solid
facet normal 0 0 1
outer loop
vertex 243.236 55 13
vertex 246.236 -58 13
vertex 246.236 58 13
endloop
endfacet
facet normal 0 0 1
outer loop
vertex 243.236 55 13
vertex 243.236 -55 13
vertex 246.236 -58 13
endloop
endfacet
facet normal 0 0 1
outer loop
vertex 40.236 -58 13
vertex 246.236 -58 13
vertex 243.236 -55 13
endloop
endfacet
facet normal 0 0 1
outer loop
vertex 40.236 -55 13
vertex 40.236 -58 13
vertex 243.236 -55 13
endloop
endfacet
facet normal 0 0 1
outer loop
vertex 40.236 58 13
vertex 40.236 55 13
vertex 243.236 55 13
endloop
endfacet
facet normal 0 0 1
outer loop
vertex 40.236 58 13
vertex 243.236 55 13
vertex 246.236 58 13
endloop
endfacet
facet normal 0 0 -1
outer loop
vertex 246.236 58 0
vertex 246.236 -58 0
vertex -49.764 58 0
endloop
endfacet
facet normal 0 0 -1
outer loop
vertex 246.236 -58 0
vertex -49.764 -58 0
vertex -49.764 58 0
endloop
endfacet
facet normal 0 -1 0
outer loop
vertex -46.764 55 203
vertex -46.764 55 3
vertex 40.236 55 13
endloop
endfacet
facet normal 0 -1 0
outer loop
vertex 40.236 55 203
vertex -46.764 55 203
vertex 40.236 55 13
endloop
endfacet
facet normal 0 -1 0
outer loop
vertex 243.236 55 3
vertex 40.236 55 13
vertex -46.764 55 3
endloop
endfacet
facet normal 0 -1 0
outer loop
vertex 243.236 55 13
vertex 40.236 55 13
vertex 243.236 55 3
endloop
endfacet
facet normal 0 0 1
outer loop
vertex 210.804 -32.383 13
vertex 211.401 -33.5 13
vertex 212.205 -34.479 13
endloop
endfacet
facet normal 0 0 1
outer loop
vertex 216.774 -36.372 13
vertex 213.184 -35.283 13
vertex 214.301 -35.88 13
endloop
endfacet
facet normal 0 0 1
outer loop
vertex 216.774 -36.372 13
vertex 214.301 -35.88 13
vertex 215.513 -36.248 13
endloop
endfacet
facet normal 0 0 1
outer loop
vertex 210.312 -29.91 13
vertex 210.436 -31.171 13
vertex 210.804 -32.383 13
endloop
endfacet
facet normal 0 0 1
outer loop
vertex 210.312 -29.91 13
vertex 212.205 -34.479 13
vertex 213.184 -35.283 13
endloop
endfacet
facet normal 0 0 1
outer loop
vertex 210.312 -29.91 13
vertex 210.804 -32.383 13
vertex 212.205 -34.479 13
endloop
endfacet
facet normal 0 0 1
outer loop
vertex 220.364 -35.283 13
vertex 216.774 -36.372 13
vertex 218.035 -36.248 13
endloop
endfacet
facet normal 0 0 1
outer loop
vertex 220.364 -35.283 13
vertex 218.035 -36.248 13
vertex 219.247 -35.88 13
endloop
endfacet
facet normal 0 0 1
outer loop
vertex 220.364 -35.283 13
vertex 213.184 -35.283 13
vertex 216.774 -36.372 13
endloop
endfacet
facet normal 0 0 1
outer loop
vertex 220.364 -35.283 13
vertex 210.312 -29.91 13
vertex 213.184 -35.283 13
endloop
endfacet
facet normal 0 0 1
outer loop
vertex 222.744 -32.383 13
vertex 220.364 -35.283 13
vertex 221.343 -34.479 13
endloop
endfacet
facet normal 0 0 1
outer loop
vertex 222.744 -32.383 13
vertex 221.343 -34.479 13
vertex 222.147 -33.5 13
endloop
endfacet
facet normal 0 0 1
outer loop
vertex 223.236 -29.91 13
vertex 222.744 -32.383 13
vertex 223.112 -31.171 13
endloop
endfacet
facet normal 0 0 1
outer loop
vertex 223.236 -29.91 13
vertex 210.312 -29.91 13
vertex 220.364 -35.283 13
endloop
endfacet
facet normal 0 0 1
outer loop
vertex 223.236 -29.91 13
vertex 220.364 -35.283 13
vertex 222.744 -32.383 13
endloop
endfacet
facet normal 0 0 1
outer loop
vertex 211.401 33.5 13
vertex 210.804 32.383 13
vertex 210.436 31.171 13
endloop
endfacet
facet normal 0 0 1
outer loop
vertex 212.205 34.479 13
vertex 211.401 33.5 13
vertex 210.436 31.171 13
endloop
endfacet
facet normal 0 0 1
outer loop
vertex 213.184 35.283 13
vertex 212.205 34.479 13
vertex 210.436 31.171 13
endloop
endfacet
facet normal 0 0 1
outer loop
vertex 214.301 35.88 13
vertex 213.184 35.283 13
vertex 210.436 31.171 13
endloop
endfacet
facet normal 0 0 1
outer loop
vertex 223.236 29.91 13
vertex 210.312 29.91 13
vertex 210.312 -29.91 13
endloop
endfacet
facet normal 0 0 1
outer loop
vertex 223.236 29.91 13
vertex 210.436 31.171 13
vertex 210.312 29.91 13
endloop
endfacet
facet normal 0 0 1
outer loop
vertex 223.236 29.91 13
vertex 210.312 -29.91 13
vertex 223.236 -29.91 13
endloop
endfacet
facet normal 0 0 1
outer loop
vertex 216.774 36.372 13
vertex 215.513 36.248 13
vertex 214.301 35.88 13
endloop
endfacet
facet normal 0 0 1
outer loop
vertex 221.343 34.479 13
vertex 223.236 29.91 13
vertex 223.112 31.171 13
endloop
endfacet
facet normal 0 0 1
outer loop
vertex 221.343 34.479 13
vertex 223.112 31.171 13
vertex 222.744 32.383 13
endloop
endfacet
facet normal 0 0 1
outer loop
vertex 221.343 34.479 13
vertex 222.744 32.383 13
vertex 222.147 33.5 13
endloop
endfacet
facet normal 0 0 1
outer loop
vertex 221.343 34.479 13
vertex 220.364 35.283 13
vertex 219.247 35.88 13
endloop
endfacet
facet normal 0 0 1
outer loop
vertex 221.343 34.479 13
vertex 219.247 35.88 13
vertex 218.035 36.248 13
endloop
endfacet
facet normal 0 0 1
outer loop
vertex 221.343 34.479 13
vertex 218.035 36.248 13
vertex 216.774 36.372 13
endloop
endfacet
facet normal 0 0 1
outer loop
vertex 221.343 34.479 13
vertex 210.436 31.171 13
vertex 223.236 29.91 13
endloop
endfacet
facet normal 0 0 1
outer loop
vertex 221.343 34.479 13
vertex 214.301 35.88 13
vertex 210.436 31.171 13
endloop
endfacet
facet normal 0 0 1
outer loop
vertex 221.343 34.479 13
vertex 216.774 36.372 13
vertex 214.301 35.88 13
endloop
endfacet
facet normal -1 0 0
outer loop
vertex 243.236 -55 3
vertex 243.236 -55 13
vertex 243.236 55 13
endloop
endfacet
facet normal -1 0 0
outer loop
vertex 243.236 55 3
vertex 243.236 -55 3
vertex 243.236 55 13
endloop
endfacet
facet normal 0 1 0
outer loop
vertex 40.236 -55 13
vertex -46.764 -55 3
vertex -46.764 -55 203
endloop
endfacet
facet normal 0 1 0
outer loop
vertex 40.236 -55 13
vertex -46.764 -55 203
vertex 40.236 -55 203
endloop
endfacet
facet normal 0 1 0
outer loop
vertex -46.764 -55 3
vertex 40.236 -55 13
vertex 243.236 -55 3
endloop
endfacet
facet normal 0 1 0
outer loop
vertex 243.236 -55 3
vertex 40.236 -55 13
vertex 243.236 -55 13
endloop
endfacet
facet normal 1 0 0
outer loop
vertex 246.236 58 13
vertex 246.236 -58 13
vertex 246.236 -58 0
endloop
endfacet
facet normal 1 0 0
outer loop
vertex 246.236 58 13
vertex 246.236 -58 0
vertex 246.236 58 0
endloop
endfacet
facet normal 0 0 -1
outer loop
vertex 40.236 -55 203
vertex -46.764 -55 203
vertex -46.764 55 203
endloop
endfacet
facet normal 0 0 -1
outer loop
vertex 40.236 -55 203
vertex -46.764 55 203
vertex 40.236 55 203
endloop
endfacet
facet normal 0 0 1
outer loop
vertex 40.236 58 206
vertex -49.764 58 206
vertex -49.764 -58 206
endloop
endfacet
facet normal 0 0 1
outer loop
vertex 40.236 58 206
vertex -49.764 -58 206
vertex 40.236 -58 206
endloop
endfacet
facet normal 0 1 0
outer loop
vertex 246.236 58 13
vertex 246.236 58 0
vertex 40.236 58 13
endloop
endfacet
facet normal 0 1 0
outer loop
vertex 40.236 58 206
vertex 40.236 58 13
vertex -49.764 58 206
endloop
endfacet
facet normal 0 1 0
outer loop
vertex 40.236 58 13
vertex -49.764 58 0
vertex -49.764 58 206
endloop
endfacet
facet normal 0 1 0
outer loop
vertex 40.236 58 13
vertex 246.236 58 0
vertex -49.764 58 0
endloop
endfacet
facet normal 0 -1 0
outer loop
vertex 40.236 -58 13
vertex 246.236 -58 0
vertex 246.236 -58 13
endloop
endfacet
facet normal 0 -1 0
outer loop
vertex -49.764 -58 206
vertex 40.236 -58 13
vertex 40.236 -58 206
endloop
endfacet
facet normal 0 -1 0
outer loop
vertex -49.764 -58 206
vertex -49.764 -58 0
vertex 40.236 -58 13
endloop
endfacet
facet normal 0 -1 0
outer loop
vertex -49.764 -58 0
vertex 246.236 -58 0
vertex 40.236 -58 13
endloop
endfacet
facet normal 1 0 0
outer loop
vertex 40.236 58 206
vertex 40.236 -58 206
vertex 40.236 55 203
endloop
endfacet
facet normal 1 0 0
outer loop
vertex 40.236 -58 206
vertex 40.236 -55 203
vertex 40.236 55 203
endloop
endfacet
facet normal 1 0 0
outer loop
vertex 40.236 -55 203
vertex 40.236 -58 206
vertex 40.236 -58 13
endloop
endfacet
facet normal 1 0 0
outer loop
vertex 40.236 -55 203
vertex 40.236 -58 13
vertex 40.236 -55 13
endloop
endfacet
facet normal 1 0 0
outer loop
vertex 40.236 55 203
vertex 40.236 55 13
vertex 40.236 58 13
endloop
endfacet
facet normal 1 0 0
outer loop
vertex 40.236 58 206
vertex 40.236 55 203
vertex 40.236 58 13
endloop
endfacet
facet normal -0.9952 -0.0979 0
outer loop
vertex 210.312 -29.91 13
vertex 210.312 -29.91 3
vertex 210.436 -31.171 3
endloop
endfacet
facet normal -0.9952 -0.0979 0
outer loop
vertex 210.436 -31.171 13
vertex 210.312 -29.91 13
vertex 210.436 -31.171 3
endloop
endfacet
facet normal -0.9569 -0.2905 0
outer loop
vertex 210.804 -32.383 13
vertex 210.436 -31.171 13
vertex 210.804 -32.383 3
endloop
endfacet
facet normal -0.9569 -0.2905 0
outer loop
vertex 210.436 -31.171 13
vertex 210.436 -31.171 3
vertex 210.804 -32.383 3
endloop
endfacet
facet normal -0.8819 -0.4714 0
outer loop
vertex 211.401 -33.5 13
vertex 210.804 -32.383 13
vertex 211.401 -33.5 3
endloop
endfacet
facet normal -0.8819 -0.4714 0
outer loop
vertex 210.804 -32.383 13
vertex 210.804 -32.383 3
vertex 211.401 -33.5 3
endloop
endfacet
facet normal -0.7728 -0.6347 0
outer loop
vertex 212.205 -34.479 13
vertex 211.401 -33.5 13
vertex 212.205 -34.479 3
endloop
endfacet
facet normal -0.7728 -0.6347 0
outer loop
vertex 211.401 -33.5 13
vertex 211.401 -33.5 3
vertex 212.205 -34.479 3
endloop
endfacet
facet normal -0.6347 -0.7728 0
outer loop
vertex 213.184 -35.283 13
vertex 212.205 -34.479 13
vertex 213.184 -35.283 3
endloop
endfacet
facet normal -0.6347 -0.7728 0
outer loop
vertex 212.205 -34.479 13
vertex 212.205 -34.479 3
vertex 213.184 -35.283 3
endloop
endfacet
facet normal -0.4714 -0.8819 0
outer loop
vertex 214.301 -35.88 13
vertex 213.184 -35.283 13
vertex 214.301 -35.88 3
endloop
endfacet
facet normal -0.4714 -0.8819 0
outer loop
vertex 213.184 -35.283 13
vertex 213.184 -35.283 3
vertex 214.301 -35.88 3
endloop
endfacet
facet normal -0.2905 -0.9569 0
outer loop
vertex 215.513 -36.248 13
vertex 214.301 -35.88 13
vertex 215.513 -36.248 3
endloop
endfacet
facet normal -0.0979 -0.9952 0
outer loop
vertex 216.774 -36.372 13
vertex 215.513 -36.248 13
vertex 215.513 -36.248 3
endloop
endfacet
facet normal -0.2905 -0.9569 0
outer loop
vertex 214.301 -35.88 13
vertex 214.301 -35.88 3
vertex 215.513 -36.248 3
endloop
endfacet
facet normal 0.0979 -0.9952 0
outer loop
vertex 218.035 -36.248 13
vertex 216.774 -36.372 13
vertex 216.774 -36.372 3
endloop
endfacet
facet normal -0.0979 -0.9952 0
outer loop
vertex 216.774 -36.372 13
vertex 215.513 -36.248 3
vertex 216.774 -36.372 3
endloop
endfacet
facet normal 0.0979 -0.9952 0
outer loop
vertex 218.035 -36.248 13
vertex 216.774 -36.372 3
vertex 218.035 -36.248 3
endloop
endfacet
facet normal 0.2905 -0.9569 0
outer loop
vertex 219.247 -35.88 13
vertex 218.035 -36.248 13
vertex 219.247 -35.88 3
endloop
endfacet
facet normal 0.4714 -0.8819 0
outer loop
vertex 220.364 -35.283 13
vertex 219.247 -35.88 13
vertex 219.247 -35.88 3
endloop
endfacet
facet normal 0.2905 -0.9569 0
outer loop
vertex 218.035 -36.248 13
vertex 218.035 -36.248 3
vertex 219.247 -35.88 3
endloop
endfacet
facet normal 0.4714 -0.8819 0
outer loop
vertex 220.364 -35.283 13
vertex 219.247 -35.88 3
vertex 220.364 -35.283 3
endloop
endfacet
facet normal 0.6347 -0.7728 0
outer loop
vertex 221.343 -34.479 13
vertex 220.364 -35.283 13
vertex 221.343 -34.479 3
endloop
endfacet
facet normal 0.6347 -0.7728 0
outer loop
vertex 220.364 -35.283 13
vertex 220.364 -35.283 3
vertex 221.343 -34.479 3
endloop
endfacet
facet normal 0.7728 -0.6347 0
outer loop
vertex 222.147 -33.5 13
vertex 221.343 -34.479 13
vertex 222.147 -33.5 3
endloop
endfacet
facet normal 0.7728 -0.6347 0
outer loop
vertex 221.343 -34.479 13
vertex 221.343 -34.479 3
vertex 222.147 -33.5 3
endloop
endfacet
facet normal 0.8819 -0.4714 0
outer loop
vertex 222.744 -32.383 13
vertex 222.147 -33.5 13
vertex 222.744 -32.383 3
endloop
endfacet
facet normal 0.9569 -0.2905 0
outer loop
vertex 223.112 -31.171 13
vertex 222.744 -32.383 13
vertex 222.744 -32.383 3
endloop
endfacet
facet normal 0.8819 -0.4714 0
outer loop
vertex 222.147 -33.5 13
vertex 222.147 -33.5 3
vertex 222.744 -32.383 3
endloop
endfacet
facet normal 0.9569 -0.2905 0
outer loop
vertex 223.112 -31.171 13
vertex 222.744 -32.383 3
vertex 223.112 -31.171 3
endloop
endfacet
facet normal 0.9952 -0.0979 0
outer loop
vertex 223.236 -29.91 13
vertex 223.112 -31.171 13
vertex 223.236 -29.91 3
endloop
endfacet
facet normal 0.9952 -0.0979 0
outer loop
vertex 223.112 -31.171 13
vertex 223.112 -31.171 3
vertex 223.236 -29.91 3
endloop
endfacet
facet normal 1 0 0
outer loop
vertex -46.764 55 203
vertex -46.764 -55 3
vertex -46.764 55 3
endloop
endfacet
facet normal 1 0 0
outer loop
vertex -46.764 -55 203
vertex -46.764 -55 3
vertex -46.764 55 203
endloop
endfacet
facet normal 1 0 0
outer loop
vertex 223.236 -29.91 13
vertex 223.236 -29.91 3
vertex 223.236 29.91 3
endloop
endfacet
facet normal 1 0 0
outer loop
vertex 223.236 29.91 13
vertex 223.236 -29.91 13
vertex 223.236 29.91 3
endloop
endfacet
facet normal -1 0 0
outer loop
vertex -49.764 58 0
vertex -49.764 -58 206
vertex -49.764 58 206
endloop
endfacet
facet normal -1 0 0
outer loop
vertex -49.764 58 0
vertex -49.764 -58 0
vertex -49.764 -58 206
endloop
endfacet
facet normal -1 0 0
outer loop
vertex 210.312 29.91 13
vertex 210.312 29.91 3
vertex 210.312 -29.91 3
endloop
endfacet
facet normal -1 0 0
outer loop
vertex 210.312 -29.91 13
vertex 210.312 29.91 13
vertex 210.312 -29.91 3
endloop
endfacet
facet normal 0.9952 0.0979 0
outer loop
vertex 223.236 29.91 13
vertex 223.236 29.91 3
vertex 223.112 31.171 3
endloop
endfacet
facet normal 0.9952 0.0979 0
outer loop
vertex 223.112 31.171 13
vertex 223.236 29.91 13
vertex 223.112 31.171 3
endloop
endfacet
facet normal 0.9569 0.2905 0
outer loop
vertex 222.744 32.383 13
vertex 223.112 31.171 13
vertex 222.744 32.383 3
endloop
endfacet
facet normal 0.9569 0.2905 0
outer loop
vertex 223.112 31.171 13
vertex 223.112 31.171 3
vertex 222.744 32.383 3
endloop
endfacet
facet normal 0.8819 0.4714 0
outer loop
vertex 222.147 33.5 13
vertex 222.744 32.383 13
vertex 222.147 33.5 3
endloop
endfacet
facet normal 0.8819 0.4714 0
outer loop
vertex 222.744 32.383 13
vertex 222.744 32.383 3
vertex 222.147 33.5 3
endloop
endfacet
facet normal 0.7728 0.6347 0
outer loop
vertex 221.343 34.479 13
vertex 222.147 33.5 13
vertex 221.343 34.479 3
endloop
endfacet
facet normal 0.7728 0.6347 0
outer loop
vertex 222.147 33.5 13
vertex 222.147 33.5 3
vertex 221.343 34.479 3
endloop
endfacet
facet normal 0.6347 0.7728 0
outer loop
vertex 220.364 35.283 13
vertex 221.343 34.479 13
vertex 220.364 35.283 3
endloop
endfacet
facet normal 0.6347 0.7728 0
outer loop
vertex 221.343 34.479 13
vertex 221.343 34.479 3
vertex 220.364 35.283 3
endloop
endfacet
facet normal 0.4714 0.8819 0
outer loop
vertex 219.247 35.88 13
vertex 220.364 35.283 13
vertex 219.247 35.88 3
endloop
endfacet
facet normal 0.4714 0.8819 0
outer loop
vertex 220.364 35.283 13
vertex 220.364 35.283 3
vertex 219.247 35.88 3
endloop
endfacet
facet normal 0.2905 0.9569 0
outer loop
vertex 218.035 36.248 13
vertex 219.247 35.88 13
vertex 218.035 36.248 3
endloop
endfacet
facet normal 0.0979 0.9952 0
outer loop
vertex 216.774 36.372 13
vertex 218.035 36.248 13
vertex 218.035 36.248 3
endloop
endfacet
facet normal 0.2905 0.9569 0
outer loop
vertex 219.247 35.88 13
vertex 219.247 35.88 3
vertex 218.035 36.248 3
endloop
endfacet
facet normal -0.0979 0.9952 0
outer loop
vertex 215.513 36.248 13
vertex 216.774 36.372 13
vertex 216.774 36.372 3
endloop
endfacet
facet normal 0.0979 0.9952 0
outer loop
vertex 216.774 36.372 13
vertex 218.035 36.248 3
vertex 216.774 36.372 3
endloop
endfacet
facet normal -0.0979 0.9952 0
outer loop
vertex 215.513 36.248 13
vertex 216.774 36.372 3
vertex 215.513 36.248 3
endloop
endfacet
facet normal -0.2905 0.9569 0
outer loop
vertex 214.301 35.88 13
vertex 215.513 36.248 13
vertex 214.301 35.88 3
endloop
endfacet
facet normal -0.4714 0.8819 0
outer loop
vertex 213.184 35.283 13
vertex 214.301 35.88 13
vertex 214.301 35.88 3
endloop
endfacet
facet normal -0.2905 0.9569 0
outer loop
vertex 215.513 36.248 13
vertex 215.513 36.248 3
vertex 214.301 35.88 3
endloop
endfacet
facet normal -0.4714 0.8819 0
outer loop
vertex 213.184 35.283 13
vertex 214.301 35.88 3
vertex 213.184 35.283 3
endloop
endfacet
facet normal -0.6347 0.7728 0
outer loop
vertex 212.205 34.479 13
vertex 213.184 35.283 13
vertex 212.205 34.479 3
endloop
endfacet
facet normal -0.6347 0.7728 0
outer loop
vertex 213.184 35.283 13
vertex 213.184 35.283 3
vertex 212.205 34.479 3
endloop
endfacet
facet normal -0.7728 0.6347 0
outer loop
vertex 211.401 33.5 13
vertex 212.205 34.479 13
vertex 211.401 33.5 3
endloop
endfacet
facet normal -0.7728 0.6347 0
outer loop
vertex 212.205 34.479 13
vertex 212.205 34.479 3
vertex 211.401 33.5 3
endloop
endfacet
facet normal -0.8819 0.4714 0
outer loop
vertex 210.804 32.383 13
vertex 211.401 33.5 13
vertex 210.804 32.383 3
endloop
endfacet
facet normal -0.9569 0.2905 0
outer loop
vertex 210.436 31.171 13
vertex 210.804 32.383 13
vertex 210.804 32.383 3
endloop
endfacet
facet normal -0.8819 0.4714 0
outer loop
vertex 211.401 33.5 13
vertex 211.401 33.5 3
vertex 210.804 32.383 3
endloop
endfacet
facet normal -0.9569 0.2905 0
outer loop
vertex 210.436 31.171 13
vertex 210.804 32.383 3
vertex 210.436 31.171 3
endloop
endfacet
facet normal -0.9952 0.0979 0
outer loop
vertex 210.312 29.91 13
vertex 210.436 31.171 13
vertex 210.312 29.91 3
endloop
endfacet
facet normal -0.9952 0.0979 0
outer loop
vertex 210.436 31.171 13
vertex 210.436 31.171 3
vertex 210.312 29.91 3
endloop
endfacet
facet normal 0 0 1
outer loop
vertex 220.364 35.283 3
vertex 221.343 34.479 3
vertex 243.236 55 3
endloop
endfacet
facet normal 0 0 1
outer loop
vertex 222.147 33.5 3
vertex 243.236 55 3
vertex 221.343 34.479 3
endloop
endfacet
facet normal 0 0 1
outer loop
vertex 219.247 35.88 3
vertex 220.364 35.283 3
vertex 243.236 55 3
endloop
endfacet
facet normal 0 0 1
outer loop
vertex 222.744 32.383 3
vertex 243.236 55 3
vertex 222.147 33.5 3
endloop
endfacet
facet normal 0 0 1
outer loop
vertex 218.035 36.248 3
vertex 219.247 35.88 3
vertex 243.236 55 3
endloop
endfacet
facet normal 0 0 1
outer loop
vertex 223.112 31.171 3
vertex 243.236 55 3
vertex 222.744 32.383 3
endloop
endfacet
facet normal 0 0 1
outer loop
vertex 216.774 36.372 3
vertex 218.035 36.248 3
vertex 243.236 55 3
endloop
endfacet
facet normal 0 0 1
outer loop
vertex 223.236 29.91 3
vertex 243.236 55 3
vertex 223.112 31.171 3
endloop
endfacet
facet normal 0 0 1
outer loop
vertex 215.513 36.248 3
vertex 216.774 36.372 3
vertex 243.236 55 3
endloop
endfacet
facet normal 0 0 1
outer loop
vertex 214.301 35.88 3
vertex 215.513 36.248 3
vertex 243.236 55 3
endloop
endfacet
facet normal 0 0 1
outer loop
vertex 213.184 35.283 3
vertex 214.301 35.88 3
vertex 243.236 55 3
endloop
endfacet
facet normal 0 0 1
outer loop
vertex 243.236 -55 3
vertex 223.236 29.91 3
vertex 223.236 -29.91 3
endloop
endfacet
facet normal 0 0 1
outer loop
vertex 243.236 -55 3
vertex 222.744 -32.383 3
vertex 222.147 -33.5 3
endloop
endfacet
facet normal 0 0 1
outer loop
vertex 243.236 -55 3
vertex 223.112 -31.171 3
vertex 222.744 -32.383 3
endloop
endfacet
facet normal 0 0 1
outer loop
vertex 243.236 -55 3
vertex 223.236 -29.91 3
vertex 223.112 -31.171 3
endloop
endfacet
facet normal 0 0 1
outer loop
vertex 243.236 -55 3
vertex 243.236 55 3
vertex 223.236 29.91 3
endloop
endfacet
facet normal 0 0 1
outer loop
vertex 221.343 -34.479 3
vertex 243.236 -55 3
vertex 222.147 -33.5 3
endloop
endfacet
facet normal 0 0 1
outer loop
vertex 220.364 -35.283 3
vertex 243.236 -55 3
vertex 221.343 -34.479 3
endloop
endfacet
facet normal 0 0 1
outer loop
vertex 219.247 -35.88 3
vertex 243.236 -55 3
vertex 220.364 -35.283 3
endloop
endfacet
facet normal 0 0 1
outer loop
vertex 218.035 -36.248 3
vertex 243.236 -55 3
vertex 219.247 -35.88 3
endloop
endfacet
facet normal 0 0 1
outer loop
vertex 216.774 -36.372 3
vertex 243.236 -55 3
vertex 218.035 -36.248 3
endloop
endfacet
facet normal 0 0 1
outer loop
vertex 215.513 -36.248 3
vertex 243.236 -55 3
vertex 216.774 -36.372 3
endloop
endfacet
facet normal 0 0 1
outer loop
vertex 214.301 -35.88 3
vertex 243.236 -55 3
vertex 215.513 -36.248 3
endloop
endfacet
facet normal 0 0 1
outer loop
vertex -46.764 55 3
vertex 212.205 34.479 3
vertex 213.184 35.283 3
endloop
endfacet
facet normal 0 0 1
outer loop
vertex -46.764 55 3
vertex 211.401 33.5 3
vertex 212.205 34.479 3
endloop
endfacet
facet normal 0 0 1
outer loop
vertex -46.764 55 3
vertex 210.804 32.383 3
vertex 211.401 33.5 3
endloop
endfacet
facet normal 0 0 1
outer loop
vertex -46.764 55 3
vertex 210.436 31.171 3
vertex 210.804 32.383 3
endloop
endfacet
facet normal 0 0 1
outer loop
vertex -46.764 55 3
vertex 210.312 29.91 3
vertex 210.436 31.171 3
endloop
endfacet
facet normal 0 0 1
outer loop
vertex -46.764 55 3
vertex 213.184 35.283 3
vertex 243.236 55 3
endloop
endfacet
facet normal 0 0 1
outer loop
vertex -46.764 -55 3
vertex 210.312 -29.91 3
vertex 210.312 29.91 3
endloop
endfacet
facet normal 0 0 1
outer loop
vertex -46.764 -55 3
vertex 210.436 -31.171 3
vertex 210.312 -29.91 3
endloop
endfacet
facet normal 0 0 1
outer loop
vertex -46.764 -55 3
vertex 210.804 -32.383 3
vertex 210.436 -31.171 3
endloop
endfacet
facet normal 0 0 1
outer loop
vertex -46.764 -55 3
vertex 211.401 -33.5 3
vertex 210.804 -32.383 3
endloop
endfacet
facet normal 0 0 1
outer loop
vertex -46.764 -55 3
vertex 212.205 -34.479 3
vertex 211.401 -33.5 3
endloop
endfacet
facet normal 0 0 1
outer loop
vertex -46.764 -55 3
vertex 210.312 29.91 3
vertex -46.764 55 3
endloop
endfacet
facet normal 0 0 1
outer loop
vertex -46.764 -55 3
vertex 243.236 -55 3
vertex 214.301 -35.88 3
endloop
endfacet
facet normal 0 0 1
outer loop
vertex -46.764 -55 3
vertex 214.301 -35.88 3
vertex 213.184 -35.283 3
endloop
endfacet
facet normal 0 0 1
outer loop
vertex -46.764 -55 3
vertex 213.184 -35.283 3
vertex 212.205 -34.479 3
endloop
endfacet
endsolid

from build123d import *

# Parameters (mm, degrees)
F1_DEPTH      = 55
F1_DEPTH_BACK = 55
F4_DEPTH      = 3
F6_W          = 90
F6_H          = 116
F7_DEPTH      = 3
F9_W          = 116
F9_H          = 13
F10_DEPTH     = 3
F13_DEPTH     = 10


# Not quite as in the source:
# - a pattern or mirror of a feature is missing from the dataset's text; its kind, count and spacing are read off the source's solid


with BuildPart() as f1:
    # F0 (on Front) → F1 (new body, two sides)
    with BuildSketch(Plane.XZ) as f1_sk:
        Polygon((-49.7641339898, 203), (-49.7641339898, 0), (243.2358660102, 0), (243.2358660102, 3), (-46.7641339898, 3), (-46.7641339898, 203), align=None)
    extrude(amount=F1_DEPTH)
    extrude(f1_sk.sketch, amount=-F1_DEPTH_BACK)

    # F3 (on offset) → F4 (join)
    with BuildSketch(Plane.XZ.offset(55)):
        Polygon((40.2358660102, 203), (-49.7641339898, 203), (-49.7641339898, 0), (243.2358660102, 0), (243.2358660102, 13), (40.2358660102, 13), align=None)
    f4 = extrude(amount=F4_DEPTH)

    # F4_copies: F4 across plane
    add(f4.mirror(Plane.ZX))

    # F6 (on face) → F7 (join)
    with BuildSketch(Plane.XY.offset(203)):
        with Locations((-4.7641339898, 0)):
            Rectangle(F6_W, F6_H)
    extrude(amount=F7_DEPTH)

    # F9 (on face) → F10 (join)
    with BuildSketch(Plane.YZ.offset(243.2358660102)):
        with Locations((0, 6.5)):
            Rectangle(F9_W, F9_H)
    extrude(amount=F10_DEPTH)

    # F12 (on offset) → F13 (join)
    with BuildSketch(Plane.XY.offset(3)):
        with BuildLine():
            Line((210.3120674863, 29.9101863056), (210.3120674863, 0))
            Line((210.3120674863, 0), (210.3120674863, -29.9101863056))
            ThreePointArc((210.3120674863, -29.9101863056), (216.7739667483, -36.3720855676), (223.2358660102, -29.9101863056))
            Line((223.2358660102, -29.9101863056), (223.2358660102, 0))
            Line((223.2358660102, 0), (223.2358660102, 29.9101863056))
            ThreePointArc((223.2358660102, 29.9101863056), (216.7739667483, 36.3720855676), (210.3120674863, 29.9101863056))
        make_face()
    extrude(amount=F13_DEPTH)


solid = f1.part
